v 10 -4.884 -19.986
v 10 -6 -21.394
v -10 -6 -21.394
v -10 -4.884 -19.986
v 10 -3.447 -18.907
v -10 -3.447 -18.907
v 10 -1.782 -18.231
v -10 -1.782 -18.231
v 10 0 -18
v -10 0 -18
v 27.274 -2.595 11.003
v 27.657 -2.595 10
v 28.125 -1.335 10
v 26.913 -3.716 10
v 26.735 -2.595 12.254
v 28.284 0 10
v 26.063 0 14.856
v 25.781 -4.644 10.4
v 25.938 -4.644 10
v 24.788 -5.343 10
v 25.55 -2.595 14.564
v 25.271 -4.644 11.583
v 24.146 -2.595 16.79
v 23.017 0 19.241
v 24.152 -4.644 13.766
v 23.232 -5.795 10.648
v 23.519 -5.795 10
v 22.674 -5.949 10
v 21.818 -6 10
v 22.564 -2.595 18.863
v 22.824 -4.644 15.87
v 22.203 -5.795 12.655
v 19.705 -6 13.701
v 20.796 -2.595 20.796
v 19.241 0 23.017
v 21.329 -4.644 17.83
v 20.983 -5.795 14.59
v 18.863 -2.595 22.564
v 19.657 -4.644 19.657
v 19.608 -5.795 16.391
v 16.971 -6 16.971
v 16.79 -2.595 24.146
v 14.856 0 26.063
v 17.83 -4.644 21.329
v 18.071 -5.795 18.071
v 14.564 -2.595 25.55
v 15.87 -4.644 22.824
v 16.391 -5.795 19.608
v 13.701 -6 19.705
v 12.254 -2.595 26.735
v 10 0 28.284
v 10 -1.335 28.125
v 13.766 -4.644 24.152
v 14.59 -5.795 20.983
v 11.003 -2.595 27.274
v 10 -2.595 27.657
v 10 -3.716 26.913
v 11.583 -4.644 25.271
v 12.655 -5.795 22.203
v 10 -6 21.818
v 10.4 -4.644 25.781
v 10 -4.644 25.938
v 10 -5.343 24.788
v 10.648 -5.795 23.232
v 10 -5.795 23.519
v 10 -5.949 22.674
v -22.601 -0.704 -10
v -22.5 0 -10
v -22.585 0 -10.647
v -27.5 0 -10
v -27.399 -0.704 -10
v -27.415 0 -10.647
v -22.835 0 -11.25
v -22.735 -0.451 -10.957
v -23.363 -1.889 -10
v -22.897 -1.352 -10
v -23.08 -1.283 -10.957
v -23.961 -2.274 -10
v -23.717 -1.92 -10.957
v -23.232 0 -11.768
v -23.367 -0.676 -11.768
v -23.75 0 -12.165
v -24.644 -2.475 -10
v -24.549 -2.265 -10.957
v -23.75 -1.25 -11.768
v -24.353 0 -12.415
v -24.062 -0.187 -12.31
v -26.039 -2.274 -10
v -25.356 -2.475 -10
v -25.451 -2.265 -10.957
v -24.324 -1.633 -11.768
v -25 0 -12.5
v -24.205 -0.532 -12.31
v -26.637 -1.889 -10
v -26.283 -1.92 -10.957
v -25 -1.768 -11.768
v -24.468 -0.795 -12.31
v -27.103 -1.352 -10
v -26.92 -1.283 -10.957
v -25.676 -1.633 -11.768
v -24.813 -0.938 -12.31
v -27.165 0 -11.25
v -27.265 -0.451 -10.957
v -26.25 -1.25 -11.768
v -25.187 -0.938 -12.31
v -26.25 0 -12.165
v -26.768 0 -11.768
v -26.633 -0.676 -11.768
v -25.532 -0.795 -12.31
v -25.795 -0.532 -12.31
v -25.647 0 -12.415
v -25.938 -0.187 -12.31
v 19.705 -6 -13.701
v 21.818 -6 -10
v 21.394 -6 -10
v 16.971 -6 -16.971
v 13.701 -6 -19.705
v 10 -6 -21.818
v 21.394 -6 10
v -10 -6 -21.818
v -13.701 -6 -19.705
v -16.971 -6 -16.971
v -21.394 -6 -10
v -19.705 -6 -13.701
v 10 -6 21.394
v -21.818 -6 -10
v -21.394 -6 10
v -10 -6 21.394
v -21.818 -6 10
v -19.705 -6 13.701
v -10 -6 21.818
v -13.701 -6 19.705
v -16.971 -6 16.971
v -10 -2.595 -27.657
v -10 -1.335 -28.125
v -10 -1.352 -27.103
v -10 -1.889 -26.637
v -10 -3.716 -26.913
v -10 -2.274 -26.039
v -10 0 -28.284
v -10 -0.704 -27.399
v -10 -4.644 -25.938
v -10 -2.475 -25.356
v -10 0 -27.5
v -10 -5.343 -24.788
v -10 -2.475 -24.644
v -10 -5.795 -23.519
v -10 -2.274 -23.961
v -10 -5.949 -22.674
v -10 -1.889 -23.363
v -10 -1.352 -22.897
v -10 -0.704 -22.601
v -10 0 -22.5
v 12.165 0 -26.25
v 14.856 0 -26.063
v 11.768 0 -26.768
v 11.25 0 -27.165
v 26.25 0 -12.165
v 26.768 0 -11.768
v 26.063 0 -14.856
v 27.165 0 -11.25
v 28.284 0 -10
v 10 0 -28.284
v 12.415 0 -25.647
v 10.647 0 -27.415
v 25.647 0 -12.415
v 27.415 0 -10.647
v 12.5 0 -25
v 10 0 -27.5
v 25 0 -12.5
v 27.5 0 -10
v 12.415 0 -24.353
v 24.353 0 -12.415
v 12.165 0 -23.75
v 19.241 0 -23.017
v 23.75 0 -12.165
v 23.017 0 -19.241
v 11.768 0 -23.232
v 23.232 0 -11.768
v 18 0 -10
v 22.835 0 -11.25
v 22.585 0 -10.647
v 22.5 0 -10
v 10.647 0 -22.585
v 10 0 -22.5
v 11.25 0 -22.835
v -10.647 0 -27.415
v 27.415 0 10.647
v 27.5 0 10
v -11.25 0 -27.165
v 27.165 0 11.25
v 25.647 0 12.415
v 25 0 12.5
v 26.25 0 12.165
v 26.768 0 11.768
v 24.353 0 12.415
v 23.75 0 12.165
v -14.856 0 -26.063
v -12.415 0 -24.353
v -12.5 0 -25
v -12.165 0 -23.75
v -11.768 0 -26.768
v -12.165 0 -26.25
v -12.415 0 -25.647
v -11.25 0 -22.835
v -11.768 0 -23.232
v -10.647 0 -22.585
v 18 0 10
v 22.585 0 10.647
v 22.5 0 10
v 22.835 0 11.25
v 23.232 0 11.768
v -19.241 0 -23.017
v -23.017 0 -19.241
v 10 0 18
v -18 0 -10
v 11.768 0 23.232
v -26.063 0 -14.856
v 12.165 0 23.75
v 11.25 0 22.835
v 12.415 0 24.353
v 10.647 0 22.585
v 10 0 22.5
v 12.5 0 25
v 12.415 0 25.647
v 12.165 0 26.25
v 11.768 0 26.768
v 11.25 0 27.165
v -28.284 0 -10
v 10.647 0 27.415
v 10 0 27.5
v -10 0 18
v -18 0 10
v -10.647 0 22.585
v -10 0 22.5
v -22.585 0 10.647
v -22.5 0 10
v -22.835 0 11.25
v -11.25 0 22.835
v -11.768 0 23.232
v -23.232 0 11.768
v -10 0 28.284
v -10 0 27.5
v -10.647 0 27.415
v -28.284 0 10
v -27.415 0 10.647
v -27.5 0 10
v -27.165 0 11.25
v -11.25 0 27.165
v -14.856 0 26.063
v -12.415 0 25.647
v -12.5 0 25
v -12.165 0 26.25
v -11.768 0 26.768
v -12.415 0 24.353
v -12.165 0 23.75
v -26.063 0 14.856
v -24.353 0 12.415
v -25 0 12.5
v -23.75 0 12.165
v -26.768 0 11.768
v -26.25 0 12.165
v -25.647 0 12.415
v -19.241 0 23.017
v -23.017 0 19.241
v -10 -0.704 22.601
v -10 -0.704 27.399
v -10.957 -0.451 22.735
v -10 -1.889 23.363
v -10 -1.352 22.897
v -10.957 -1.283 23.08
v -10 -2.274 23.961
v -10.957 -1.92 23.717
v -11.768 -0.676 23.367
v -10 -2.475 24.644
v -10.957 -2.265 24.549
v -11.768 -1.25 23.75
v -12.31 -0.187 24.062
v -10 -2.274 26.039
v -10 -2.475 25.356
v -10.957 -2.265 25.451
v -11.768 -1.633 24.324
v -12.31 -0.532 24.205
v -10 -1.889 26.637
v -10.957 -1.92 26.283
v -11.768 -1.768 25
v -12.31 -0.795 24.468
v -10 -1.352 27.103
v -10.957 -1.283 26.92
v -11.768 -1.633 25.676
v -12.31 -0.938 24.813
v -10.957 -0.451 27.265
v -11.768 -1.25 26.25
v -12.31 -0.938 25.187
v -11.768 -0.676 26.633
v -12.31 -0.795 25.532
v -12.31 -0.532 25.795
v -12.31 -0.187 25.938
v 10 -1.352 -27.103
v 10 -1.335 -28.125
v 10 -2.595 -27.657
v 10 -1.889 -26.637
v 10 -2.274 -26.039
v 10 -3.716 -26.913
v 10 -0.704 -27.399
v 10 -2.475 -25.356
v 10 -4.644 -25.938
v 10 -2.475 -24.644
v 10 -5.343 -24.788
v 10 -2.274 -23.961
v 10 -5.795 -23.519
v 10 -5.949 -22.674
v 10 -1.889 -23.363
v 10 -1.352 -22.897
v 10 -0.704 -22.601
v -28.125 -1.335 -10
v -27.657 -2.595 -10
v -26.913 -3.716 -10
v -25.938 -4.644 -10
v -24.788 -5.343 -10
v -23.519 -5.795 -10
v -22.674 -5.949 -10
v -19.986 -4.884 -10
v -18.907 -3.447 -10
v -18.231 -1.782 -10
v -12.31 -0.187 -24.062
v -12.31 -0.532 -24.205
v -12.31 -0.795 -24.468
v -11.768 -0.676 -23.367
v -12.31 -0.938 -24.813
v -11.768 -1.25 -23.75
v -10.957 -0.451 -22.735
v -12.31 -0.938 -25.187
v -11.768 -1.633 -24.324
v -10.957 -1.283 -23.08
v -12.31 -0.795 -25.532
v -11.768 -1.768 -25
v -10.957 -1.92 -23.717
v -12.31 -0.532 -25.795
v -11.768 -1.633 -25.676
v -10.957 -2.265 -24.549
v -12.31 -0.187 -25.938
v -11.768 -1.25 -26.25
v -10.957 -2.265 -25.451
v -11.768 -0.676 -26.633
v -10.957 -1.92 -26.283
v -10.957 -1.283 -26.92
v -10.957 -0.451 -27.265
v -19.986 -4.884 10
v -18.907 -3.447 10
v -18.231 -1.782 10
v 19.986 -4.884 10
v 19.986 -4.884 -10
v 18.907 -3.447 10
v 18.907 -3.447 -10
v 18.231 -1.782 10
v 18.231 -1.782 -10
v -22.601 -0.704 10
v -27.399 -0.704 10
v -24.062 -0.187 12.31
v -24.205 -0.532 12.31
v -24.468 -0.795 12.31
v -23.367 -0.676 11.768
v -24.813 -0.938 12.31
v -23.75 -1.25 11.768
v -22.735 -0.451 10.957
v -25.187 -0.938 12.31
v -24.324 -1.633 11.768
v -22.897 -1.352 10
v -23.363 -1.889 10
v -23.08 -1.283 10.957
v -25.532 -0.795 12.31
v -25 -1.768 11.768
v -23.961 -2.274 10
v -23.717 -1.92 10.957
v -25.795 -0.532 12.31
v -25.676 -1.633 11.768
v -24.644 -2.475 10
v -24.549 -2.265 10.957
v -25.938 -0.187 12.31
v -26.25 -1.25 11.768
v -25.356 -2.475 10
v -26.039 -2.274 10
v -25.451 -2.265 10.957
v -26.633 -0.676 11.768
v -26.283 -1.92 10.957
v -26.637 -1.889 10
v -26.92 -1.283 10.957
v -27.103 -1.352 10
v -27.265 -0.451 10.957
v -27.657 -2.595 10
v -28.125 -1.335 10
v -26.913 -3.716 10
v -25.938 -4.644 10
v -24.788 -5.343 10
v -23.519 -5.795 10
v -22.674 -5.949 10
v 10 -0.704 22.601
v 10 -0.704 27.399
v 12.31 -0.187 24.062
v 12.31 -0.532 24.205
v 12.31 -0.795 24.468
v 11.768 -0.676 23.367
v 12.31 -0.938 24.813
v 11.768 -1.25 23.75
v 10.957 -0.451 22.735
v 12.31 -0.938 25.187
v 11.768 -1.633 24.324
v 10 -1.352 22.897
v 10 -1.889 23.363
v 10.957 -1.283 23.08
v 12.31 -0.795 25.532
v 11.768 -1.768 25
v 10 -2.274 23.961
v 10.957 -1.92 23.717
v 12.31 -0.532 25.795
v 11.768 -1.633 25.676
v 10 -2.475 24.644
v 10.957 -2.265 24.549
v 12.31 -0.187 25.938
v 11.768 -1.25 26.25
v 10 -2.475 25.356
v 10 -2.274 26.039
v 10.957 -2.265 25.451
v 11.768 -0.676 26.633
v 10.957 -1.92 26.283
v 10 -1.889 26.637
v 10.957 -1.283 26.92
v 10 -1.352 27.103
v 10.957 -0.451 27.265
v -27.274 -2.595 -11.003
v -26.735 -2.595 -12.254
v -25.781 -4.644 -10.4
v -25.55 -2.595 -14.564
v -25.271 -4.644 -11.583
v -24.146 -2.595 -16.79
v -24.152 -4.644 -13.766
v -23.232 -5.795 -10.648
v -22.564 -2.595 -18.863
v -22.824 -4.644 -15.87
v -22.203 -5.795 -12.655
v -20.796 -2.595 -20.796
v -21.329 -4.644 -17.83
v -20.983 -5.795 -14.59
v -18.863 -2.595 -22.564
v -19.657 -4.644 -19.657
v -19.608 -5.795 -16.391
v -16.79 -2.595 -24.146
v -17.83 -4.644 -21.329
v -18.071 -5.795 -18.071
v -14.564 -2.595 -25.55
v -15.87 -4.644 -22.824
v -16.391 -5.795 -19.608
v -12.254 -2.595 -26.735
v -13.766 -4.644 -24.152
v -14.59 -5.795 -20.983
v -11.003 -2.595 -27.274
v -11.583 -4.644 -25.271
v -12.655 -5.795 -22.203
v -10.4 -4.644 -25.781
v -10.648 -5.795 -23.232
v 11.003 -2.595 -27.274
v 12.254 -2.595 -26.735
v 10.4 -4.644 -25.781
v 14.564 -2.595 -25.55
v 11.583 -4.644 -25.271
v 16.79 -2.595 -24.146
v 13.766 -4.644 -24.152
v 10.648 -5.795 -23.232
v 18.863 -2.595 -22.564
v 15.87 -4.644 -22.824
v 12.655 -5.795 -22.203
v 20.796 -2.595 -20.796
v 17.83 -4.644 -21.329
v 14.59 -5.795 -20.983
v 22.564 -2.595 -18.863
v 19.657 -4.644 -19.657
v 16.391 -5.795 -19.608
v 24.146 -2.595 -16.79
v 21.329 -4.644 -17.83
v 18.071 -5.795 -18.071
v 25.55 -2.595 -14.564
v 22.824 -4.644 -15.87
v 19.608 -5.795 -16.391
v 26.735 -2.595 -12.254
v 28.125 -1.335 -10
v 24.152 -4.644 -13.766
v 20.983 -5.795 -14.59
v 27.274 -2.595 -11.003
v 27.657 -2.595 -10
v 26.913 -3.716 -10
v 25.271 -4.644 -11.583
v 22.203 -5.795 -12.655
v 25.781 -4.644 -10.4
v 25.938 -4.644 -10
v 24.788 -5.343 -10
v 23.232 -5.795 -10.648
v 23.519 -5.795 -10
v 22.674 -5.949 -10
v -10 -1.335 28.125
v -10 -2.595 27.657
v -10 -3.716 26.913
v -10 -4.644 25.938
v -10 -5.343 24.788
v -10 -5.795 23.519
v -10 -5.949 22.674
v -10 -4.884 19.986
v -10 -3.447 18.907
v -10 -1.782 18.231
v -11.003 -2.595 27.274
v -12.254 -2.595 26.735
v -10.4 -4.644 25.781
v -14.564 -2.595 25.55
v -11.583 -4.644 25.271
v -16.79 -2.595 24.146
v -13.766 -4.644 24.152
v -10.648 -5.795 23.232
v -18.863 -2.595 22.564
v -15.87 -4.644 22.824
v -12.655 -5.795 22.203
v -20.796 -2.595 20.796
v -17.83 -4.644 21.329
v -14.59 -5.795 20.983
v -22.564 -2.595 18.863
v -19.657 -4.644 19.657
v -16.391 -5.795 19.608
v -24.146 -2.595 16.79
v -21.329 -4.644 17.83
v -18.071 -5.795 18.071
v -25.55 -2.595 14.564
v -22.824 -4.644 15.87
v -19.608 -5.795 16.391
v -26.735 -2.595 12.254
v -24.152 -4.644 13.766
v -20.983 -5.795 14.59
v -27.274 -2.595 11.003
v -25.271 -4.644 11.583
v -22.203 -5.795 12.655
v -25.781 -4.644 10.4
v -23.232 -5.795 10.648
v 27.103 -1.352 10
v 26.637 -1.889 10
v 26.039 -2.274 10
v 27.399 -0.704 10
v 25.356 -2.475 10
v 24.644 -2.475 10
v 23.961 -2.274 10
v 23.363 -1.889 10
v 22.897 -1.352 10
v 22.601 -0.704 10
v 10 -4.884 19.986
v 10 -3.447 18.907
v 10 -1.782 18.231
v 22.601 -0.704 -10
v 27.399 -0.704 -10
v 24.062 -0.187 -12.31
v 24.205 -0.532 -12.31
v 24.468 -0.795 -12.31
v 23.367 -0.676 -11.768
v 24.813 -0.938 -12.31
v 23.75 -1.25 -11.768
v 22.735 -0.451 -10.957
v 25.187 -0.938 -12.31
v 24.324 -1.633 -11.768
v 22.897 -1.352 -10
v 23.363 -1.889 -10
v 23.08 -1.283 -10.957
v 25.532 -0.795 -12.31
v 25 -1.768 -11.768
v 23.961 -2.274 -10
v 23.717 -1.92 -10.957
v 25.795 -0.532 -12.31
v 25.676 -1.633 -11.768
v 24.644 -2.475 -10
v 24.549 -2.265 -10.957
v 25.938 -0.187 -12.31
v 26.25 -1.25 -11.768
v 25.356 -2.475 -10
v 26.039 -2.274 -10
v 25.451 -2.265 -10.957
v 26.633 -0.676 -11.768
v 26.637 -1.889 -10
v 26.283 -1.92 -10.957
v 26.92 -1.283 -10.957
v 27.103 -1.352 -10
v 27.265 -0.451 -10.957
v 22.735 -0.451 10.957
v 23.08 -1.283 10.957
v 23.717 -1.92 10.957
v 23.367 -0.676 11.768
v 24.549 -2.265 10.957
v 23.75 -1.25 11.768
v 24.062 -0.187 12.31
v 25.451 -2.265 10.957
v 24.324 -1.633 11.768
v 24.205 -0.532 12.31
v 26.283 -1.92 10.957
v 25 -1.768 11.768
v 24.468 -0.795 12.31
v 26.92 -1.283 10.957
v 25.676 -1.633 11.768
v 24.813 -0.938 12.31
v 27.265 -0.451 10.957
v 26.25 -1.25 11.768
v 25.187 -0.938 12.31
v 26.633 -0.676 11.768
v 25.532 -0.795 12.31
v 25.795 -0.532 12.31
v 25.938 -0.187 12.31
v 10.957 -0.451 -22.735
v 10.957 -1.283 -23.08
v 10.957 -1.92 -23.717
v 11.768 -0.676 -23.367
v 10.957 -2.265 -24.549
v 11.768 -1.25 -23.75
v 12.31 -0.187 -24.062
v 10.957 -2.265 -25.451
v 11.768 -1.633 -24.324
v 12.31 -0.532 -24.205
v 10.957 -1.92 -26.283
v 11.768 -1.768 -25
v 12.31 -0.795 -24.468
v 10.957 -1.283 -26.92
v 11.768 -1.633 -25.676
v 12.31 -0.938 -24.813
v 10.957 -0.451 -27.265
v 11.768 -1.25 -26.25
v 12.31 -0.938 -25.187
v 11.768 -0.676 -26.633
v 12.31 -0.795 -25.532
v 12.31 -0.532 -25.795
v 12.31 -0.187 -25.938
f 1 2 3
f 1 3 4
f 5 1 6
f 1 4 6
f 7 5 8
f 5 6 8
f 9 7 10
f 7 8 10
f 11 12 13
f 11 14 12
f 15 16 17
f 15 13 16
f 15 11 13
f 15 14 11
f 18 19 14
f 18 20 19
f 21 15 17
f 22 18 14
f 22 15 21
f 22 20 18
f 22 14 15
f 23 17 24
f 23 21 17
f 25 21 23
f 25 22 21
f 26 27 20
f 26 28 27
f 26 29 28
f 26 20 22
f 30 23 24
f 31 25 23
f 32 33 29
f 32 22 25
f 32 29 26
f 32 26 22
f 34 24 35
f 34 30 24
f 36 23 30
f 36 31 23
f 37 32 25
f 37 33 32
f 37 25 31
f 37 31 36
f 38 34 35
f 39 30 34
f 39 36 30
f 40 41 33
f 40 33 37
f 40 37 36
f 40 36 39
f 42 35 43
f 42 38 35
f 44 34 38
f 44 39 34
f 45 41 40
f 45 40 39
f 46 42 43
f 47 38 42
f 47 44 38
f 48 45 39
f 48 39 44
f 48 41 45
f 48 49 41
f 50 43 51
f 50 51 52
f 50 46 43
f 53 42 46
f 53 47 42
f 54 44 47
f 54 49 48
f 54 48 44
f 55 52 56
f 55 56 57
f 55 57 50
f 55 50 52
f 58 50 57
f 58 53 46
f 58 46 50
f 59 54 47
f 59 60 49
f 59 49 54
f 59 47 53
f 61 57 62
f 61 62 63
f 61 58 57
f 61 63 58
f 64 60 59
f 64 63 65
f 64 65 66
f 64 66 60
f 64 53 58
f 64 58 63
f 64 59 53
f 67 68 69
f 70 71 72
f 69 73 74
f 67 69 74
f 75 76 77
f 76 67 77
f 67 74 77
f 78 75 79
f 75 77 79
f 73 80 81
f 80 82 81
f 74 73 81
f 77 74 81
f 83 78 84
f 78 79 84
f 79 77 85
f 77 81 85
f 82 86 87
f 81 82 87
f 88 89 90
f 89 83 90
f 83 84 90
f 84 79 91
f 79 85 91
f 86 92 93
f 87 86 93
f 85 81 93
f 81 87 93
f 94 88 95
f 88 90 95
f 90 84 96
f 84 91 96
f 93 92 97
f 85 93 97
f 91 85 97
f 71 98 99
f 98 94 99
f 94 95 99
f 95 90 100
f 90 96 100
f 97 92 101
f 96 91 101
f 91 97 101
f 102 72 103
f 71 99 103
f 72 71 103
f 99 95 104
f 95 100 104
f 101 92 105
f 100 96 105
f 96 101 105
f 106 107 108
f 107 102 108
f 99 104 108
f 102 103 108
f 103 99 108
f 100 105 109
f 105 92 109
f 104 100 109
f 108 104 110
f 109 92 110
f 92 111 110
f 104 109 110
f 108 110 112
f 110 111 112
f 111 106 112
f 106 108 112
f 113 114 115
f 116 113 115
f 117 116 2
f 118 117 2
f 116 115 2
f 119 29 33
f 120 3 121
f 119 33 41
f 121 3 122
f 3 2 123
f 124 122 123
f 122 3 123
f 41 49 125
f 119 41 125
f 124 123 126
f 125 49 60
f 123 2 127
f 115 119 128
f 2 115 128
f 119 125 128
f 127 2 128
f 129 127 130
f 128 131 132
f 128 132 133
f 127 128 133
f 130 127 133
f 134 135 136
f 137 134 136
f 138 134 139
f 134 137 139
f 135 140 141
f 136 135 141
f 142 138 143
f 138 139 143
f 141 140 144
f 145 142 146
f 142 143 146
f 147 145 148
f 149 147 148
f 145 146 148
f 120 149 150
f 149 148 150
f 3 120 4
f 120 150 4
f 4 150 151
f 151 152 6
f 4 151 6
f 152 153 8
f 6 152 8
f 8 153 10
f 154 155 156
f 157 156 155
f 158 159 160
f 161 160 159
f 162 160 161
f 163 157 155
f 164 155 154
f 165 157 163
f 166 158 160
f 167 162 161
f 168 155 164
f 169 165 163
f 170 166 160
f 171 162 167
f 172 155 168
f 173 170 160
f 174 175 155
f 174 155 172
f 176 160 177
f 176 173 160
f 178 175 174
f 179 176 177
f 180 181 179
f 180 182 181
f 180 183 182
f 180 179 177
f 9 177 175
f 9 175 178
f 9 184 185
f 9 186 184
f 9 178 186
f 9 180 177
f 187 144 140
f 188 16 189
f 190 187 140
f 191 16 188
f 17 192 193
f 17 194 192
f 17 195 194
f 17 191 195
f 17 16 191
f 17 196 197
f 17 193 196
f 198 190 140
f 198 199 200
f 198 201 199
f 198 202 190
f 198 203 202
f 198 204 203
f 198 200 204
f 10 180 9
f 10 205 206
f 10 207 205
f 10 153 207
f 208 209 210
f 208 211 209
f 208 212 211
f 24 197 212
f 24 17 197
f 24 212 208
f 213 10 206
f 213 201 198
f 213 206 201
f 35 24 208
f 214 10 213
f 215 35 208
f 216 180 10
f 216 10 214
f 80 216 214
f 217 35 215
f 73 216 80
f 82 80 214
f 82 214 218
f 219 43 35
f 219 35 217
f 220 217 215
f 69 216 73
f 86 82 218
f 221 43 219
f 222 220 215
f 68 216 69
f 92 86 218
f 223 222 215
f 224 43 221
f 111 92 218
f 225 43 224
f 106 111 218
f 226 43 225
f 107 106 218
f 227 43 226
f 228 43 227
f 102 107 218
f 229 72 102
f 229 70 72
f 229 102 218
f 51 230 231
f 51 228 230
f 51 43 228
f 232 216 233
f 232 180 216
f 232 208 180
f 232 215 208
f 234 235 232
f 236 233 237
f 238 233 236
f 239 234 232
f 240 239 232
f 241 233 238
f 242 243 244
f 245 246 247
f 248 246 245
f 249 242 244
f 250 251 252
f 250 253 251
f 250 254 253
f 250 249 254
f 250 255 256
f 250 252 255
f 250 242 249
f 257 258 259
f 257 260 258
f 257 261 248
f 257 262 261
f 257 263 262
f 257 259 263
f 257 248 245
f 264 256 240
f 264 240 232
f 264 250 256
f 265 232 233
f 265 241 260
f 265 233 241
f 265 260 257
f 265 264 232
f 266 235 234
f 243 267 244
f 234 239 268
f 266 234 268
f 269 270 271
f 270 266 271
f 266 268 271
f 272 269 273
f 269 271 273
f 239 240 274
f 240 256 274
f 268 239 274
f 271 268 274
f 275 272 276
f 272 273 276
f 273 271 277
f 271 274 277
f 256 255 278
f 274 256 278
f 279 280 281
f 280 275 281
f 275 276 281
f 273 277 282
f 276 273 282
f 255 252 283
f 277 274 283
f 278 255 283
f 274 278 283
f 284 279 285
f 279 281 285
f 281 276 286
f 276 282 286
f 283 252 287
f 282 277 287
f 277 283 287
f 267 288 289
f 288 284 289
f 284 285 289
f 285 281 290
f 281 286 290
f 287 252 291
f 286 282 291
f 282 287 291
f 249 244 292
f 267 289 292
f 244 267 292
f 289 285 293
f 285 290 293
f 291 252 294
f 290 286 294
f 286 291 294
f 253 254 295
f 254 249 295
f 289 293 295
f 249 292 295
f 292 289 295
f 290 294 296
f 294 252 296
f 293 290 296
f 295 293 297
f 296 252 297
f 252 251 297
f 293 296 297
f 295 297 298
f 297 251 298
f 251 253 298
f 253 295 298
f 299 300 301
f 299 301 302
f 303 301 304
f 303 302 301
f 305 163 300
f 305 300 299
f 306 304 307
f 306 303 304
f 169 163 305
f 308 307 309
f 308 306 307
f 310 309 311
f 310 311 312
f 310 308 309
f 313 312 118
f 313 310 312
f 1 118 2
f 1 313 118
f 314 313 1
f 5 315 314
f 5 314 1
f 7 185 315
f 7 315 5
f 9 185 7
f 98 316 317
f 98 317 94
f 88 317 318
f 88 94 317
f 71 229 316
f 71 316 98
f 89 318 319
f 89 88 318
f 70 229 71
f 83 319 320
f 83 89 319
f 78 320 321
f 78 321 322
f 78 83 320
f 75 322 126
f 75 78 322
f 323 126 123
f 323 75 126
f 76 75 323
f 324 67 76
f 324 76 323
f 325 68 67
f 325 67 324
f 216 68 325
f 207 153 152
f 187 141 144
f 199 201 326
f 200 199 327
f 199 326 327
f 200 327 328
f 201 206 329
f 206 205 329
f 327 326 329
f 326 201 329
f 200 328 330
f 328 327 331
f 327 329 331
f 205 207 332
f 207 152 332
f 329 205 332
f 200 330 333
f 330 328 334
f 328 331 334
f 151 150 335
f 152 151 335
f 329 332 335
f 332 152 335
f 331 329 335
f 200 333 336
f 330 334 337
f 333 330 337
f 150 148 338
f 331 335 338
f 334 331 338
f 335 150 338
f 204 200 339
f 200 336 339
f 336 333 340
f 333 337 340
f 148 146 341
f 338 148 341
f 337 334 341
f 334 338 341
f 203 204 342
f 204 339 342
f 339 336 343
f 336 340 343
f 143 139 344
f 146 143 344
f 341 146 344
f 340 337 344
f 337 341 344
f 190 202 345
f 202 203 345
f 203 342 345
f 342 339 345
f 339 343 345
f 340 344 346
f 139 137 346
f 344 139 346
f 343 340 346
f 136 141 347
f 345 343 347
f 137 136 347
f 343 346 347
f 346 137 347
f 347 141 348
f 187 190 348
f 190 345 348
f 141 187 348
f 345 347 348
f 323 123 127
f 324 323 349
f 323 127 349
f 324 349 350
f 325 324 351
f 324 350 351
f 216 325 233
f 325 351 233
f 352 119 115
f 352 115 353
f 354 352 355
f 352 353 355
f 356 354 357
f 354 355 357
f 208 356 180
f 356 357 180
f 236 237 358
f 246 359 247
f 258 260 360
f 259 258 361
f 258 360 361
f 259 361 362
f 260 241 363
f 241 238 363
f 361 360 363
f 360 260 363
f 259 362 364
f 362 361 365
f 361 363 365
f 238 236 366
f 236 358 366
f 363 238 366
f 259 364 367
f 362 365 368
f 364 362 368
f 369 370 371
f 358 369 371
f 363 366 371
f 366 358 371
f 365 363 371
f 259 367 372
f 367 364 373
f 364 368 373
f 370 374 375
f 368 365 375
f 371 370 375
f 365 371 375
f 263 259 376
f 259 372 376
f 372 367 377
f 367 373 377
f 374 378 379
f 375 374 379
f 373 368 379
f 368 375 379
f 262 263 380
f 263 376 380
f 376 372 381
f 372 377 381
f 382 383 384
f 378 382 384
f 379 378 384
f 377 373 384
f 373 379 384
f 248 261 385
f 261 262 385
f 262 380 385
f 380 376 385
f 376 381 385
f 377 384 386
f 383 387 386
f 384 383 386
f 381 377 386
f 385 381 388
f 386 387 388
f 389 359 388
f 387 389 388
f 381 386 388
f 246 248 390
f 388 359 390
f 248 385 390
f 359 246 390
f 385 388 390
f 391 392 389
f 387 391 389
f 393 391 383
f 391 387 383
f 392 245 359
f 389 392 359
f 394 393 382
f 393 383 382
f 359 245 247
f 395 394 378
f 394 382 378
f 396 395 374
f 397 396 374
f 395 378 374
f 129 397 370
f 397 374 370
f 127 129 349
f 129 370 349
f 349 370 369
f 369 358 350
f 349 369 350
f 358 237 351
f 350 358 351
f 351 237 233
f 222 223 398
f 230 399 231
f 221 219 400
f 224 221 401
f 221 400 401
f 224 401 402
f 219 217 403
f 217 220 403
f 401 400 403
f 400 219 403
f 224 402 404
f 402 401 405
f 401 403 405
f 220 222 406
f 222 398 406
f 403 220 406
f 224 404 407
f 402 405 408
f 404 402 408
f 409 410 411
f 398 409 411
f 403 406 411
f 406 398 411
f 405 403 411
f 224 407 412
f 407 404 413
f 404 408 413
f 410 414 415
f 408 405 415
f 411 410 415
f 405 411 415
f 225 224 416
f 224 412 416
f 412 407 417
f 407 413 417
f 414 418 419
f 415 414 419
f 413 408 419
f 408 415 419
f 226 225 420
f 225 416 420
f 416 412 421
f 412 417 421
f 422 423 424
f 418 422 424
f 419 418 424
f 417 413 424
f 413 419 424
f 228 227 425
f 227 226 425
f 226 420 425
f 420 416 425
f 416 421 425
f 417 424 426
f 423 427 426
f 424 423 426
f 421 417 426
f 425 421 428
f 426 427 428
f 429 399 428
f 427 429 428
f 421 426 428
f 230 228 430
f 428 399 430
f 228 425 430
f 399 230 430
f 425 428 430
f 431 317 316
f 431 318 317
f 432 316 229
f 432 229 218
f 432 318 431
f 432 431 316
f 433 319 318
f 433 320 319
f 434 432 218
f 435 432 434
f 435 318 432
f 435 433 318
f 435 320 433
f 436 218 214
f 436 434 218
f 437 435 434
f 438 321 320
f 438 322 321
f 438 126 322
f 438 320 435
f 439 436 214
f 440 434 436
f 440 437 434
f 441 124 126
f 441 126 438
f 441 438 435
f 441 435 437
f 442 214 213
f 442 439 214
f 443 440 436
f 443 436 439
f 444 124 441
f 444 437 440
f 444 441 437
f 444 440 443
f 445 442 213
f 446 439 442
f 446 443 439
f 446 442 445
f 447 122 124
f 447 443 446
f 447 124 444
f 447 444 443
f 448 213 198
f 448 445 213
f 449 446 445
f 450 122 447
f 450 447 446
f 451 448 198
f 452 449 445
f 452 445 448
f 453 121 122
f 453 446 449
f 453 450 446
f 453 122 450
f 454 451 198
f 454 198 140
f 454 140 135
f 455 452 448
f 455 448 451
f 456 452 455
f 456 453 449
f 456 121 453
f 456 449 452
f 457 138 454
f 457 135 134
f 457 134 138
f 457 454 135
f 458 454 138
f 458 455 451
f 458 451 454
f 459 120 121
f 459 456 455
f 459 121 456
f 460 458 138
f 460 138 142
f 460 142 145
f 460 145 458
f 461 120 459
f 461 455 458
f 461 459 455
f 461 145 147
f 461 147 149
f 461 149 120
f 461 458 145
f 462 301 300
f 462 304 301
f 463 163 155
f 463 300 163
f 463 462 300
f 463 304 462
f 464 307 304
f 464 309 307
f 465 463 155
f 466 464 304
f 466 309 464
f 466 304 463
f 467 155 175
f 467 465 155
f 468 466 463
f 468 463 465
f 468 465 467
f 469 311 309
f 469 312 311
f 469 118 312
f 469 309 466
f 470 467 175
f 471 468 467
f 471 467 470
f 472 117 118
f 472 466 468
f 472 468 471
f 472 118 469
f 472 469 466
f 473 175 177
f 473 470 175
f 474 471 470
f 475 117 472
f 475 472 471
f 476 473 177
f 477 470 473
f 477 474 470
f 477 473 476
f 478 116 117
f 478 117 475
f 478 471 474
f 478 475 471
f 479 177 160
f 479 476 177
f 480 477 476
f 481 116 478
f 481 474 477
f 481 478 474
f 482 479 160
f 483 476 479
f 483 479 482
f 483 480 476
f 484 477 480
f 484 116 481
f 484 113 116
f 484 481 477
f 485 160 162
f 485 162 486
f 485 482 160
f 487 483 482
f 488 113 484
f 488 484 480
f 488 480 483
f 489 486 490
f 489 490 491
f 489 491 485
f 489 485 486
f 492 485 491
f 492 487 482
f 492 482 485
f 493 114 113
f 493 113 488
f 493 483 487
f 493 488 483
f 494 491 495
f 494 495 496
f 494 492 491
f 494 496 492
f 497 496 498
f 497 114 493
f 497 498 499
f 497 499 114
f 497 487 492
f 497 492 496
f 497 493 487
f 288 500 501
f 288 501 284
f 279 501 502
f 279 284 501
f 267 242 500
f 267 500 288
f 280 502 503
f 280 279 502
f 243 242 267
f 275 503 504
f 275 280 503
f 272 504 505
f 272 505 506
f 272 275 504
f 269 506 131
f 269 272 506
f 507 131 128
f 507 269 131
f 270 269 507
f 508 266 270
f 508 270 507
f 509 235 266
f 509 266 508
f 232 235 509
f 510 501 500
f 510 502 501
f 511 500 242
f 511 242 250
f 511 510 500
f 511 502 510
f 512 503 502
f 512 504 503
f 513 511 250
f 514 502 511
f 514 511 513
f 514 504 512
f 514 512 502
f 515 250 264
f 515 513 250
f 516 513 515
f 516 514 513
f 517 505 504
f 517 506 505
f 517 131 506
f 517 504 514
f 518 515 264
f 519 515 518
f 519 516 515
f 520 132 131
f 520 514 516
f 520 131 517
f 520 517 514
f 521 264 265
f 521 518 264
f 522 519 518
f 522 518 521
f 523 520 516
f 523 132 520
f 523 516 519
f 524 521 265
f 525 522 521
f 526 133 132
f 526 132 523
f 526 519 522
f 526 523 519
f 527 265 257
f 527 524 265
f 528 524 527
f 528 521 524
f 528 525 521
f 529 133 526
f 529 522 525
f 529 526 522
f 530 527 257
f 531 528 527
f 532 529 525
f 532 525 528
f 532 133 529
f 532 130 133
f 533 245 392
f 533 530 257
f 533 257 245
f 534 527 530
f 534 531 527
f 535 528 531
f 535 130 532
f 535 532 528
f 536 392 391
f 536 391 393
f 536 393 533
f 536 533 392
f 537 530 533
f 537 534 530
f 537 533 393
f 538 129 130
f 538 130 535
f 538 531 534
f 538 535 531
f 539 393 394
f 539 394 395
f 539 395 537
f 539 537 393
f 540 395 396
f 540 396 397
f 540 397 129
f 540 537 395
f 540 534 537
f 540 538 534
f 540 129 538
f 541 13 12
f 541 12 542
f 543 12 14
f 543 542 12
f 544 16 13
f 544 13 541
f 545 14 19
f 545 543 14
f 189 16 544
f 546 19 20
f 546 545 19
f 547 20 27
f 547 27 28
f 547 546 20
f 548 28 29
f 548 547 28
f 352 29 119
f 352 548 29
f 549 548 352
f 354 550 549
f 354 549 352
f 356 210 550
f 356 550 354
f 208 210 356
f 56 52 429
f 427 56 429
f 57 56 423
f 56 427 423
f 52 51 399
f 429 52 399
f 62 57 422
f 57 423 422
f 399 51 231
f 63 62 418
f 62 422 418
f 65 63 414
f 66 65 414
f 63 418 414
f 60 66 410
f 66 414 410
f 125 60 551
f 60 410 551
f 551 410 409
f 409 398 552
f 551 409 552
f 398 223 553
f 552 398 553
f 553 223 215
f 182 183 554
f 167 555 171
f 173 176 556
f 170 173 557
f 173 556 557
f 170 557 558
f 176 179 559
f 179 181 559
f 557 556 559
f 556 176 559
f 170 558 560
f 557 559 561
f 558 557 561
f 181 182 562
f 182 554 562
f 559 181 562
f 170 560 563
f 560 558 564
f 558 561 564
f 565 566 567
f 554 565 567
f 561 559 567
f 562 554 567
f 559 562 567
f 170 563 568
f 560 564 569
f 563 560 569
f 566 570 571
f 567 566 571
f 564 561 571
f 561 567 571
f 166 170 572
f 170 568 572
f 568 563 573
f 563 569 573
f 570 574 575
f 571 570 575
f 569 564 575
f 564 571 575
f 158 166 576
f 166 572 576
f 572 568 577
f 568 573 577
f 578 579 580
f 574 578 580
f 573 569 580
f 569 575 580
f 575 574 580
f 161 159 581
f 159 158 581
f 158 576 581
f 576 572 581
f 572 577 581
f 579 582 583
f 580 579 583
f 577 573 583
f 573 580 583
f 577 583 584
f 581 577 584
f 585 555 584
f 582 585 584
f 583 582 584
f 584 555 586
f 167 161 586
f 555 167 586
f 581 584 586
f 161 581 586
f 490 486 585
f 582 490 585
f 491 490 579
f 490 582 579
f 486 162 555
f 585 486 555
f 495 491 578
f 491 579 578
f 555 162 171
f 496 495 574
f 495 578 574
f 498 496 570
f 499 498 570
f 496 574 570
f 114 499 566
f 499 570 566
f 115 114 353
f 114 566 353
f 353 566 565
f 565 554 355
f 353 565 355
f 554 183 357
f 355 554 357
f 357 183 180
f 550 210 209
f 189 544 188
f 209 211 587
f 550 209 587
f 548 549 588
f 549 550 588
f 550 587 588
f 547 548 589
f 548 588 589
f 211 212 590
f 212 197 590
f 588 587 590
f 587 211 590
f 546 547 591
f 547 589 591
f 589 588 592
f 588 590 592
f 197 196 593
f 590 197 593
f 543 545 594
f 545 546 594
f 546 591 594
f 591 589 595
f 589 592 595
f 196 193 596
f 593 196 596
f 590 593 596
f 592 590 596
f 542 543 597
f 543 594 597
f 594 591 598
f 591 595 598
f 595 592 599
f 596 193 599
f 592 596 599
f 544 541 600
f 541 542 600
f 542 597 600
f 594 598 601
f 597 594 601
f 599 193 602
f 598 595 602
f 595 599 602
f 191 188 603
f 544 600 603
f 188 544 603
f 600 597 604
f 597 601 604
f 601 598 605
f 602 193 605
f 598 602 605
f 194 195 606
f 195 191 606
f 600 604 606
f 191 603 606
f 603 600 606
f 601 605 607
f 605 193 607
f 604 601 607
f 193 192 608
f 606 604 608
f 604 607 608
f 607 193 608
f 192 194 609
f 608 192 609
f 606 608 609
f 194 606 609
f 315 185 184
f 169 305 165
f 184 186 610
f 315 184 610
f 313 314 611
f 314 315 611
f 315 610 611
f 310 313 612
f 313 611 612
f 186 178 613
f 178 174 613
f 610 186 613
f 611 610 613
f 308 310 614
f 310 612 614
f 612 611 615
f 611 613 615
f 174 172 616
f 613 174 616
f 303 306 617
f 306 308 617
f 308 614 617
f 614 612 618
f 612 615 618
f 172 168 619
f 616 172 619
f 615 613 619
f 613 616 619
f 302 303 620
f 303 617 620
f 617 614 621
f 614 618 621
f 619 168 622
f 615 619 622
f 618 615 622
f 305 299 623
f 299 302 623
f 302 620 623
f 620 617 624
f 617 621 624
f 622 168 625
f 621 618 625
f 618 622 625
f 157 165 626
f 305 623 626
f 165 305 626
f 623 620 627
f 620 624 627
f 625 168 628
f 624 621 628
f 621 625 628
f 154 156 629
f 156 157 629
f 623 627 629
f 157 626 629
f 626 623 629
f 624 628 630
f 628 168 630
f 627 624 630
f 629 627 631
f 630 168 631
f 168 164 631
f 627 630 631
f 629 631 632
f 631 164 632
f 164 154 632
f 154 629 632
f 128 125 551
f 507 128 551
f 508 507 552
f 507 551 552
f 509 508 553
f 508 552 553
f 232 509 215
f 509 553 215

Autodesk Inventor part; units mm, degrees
ref_plane "YZ Plane" through (0, 0, 0) normal (1, 0, 0) x (0, 1, 0)
ref_plane "XZ Plane" through (0, 0, 0) normal (0, 1, 0) x (-1, 0, 0)
ref_plane "XY Plane" through (0, 0, 0) normal (0, 0, 1) x (1, 0, 0)
sketch "Sketch1" plane through (0, 0, 0) normal (0, 1, 0) x (-1, 0, 0)
  circle A0 centre (0, 0) radius 30
  dimension "d0" = 60
extrude "Extrusion1" add sketch "Sketch1" against normal blind 6
sketch "Sketch2" plane through (0, 0, 0) normal (0, 1, 0) x (1, 0, 0)
  line L0 (-10, -18) -> (10, -18)
  line L1 (10, -32) -> (-10, -32)
  line L2 (-10, -18) -> (10, -32) construction
  line L3 (10, -18) -> (-10, -32) construction
  arc A0 (-7.5, -25) -> (-12.5, -25) centre (-10, -25) ccw
  arc A1 (12.5, -25) -> (7.5, -25) centre (10, -25) ccw
  line L4 (-12.5, -25) -> (12.5, -25)
  line L5 (-10, -32) -> (-10, -27.5)
  line L6 (-10, -25) -> (-10, -18)
  line L7 (10, -18) -> (10, -25)
  line L8 (10, -27.5) -> (10, -32)
  point P0 (0, 0)
  point P1 (0, -25)
  dimension "d3" = 20
  dimension "d4" = 25
  dimension "d5" = 14
  dimension "d6" = 5
  dimension "d7" = 5
revolve "Revolution1" cut sketch "Sketch2" angle 360 about axis through (-12.5, 0, 25) along (1, 0, 0)
sketch "Sketch3" plane through (0, -6, 0) normal (0, -1, 0) x (1, 0, 0)
  arc A0 (9.04, 28.6056) -> (-9.04, 28.6056) centre (0, 0) ccw projected
  line L0 (-9.04, 28.6056) -> (9.04, 28.6056) projected
  arc A1 (9.04, 28.6056) -> (-9.04, 28.6056) centre (0, 0) ccw projected
extrude "Extrusion2" cut sketch "Sketch3" against normal through all
fillet "Fillet1" radius 6 1 edges at (0, -6, -30)
pattern_circular "Circular Pattern1" count 4 over 360 about axis through (0, -10, 0) along (0, 1, 0) of "Revolution1"
properties part number "wheel_cover"
